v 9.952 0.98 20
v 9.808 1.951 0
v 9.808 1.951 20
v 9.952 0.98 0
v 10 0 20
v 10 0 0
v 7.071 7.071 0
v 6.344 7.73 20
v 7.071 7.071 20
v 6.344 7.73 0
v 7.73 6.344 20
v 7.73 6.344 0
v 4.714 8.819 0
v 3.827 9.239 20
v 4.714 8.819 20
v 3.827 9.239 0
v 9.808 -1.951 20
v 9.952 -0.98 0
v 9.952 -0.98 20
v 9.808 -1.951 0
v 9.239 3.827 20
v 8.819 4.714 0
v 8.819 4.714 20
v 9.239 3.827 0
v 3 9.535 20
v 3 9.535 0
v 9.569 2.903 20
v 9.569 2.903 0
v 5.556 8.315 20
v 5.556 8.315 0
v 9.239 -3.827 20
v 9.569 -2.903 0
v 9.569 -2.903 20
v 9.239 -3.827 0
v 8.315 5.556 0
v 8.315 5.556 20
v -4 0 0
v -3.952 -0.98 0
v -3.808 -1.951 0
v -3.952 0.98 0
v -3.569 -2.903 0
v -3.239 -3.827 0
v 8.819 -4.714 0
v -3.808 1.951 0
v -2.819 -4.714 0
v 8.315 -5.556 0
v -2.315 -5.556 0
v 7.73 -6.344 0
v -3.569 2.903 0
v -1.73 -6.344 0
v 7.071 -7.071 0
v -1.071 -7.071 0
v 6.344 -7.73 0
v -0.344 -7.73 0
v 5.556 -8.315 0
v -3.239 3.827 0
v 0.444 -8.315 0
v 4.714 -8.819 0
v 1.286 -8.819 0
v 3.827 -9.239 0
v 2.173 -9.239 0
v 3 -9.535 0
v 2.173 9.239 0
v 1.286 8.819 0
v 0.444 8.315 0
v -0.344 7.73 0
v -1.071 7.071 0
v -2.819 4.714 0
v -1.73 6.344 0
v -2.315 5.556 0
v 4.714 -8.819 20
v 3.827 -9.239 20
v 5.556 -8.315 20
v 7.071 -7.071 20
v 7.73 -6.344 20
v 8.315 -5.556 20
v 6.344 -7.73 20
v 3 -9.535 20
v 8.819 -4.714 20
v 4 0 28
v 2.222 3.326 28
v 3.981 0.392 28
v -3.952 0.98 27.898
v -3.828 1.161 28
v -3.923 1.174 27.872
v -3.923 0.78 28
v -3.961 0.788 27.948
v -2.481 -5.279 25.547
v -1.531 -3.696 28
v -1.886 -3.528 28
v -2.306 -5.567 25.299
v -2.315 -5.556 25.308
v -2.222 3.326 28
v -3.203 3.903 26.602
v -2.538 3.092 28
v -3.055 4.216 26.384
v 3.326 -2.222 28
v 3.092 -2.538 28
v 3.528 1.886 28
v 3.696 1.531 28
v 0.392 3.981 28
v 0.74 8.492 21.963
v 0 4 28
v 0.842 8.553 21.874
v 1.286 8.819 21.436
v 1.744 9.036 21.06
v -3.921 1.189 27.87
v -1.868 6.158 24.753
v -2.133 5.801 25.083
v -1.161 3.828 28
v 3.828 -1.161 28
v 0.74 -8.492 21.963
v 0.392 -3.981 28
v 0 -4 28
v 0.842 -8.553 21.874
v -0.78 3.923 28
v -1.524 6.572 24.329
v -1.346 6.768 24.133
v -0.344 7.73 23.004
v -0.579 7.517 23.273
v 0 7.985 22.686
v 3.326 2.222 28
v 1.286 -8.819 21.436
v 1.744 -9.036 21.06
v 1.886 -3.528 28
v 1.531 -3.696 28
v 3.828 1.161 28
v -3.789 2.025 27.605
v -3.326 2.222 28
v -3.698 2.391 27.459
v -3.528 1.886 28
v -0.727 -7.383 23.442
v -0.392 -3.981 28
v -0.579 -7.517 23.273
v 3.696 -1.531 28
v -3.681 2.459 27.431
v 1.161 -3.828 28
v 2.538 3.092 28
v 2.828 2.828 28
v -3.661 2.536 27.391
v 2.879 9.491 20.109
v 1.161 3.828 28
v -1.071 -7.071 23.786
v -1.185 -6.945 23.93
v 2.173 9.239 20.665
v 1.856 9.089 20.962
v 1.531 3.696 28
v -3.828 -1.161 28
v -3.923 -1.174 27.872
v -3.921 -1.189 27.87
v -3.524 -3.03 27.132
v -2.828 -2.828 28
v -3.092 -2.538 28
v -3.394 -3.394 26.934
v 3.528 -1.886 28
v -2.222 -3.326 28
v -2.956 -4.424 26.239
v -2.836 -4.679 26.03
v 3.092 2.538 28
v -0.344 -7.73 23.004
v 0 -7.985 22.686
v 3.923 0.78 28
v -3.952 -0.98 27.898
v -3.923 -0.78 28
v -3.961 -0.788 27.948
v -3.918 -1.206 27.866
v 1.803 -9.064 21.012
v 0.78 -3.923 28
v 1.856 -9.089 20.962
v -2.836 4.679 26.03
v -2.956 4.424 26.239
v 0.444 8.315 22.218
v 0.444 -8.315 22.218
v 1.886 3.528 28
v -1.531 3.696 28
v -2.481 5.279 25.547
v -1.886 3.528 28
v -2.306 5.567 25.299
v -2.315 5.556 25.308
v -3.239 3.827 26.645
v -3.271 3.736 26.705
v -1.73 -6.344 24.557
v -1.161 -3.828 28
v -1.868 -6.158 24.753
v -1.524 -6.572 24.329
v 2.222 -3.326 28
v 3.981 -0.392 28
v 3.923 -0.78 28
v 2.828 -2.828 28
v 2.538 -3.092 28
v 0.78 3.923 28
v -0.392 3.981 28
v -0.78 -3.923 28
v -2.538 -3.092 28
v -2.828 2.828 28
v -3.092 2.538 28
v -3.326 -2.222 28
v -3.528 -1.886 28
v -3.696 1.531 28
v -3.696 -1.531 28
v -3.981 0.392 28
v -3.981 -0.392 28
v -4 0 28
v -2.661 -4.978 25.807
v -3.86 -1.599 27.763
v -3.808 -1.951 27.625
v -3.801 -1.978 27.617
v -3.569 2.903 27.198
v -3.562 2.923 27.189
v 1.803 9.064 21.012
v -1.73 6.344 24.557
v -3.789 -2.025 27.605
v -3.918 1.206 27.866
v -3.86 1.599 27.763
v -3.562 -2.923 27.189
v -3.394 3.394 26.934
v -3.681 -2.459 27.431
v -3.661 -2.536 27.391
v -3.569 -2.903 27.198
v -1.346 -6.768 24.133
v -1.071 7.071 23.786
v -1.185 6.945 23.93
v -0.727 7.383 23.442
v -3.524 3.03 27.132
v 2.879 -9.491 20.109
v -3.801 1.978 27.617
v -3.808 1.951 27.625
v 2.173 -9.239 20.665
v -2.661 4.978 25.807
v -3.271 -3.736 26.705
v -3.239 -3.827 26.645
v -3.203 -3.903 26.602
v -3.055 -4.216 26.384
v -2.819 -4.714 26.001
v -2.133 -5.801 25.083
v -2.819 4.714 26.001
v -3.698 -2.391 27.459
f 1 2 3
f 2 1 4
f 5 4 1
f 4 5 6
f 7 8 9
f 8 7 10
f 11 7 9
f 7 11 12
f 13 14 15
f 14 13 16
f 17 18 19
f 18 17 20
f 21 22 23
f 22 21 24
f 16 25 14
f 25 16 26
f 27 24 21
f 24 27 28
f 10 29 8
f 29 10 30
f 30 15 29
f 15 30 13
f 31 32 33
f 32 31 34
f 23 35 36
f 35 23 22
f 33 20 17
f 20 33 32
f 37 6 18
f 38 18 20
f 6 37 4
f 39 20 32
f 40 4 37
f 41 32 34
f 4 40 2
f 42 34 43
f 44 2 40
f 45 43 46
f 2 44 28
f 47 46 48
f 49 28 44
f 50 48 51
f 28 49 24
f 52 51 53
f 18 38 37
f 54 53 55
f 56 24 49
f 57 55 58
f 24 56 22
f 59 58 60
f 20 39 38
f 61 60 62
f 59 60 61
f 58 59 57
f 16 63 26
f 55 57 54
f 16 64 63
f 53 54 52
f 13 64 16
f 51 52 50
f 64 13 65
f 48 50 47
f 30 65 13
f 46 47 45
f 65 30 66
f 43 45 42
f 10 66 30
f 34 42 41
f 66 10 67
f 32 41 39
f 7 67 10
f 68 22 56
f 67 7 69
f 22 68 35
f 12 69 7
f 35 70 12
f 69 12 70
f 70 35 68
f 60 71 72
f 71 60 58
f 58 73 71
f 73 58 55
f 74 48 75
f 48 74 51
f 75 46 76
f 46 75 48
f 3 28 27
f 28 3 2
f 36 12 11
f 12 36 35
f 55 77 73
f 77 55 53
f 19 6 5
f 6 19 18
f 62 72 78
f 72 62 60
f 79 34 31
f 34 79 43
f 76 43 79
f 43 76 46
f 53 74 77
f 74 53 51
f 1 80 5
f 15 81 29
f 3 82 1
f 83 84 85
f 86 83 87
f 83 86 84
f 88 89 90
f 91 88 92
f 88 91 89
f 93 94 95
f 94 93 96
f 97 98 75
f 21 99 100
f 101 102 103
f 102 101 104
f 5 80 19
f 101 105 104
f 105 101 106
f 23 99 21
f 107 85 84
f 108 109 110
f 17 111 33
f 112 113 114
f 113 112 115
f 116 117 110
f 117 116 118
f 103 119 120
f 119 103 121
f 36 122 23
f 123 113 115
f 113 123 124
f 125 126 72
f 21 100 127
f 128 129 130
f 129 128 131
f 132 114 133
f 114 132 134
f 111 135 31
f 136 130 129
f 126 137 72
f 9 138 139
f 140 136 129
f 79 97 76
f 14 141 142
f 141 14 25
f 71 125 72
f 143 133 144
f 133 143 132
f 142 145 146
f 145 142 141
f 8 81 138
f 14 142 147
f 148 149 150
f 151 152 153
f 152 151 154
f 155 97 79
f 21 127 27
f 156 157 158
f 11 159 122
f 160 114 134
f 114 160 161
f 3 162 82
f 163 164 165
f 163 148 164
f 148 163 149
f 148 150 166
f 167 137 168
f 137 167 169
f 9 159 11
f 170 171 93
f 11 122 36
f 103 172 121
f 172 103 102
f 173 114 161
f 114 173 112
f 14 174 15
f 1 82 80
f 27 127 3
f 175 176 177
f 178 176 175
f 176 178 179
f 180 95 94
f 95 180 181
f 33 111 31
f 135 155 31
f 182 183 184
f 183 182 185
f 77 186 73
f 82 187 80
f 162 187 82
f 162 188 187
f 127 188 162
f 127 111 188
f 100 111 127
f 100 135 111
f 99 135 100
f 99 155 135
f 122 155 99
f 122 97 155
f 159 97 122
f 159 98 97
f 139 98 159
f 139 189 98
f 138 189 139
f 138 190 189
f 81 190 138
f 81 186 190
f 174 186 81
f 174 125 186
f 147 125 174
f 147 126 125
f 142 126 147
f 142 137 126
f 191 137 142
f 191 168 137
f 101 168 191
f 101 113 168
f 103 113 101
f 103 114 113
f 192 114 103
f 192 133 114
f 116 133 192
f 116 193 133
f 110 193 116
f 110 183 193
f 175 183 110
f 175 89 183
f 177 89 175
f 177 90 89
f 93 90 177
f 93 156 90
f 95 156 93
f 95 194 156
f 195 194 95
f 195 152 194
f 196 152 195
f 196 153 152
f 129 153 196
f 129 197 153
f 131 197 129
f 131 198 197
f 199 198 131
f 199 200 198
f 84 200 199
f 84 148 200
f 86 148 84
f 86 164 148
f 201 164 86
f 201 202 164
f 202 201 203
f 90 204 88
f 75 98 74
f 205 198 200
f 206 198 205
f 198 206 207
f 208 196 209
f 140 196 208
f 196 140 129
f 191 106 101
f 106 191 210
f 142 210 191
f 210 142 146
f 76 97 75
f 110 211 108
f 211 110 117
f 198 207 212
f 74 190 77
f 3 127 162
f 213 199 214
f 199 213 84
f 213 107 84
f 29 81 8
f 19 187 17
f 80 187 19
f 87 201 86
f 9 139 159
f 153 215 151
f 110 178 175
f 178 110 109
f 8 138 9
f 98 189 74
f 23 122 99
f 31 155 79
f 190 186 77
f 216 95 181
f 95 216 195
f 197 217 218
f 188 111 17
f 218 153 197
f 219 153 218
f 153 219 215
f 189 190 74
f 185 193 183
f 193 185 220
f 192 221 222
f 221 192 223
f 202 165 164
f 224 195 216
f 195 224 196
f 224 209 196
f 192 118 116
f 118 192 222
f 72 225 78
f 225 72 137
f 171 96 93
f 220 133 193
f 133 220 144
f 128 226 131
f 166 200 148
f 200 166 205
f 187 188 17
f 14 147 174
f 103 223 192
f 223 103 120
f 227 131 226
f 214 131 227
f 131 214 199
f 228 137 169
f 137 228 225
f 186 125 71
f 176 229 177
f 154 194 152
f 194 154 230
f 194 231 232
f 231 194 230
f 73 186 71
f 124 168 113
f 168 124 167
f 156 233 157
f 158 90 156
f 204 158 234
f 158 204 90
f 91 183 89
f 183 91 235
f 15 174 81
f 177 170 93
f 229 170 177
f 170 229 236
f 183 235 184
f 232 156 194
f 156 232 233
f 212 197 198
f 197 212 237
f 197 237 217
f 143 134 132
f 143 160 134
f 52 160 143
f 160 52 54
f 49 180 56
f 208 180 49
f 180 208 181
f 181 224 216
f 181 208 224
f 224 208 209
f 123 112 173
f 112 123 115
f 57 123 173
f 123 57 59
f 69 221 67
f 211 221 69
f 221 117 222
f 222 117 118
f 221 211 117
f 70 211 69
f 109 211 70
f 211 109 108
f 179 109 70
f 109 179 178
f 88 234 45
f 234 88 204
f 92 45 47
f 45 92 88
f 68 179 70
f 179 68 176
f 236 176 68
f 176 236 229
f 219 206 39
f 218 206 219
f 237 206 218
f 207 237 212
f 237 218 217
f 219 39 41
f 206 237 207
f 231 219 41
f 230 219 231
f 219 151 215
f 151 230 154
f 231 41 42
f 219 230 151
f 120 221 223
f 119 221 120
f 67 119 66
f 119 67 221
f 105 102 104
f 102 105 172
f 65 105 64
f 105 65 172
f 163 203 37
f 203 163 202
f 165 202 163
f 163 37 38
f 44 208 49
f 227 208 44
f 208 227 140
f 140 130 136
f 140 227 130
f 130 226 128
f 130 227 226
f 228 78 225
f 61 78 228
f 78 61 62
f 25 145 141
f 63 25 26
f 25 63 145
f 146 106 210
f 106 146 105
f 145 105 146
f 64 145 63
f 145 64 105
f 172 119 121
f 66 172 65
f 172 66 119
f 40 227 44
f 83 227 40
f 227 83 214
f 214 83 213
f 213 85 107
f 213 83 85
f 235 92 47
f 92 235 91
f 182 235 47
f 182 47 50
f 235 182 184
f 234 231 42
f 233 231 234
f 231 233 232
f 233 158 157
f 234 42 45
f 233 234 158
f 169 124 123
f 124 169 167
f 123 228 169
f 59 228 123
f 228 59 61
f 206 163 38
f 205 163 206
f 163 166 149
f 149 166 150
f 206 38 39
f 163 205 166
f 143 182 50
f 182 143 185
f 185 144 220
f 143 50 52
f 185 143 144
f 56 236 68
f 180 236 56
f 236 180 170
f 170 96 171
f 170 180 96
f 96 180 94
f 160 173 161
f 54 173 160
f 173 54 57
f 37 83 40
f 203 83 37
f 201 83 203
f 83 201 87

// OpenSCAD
// A corner where one solid's cap meets another's wall, and a rim whose
// neighbour is fanned. Nine lines, and before the two fixes below it exported
// as three shells.
//
// It was registered WILL_FAIL when it was added, for a third defect neither of
// those fixes touched - two corners 3.6e-03 and 4.5e-03 off the analytic faces
// they bound - and ctest duly reported it as a *failure* on the day that stopped
// being true. What fixed it is the placement that puts a corner where the
// surfaces of the two analytic faces it bounds cross. See open items 3 and 18
// of doc/step-export-wip.md.
//
// Two defects meet in it, and neither is visible in the exact tier - that one is
// a clean solid. Both are the approximation pass's.
//
// **A corner is not where its two owners cross.** Provenance is per original
// solid: the first cylinder's original owns its wall, and its *cap* facets
// belong to that same original without being on it. So a vertex on the lens rim
// at z = 0 - where the second cylinder's wall meets the first one's bottom
// plane - is named by two walls, and the pair placement put it where those two
// walls cross, on the line x = 3, y = +/-9.5394. Twenty-six corners moved by up
// to 11.0267 on a part whose radius is 10, and the shell came apart along them.
// The other eighty-eight junctions here are real, sit on both their owners to
// 0.0120 - the 64-gon's own sagitta, 10(1 - cos(pi/64)) - and move at most
// 0.0192.
//
// **A rim cannot be handed to a face that will be fanned.** The cone's top rim
// at z = 28 is one CIRCLE on the cone's side; the cap across it is bent by the
// corner moves and so is fanned into triangles, and a fan writes one straight
// line per triangle side and never reads the substitution. That left the arc on
// one face and twenty-four chords on the other: twenty-five edges used by one
// face. The plane sections have guarded against this since item 11's root cause
// A was closed for them; the rims had not. Given up as an arc, the rim's chords
// are shared edges again, and the per-edge promotion then writes each of them as
// the arc it is - 62 arcs become 86, and the shell closes.
//
// The volume is derived twice, and the export has to lie between the two. Every
// cross section is the intersection of two circles - the part's own of radius
// a(z), and the second cylinder's of radius 10 at distance 6 - so the smooth
// solid is
//
//   20 * lens(10) + (1/0.75) * integral of lens(a) da from 4 to 10
//
// with lens(a) the standard two-circle overlap, which comes to 4891.296892. The
// mesh is the same integral over OpenSCAD's own inscribed 64-gons rather than
// circles, which comes to 4881.063273 and agrees with what the mesher reports to
// six decimals. An exported face is either the smooth surface or the mesh's
// chords, and chords are inscribed, so the solid cannot lie outside that
// bracket. It reads 4890.790271 with both flags, near the smooth end because
// most of this boundary is analytic, and 4885.633285 in the exact tier.
//
// VOLUME: 4886.180083 +/- 5.116809
// VOLUME-APPROX: 4886.180083 +/- 5.116809
//
// **What it reads now.** One solid, 4891.033991 with both flags and 4885.633285
// in the exact tier, worst kernel slack 0.007757, and every corner of every
// analytic face on the surface that face is written on. The approximation figure
// is 0.0054% under the smooth solid, which is the boundary that is still chords
// rather than the curve the two surfaces cross along.
//
// Known systemic defect: twelve facets of a D0 region - maker owns the
// surface, every corner on it exactly - are left as planes at the exact tier:
// formed as small quadric regions and refused by the writer's all-or-nothing
// boundary rule. D0 ground fallen to the tessellation with no proof that no
// closed form exists. Tolerated by name; the test fails the day it is no
// longer raised.
// KNOWN-EXPORT-ERROR: of a D0 region are left to the tessellation
// Open item 33 - on the CGAL backend, a planar face written with a bound off
// its plane - was carried here as a KNOWN-EXPORT-ERROR from 2026-09-24 until
// 2026-09-30, when the triangle merge began asking exact coplanarity: merging
// within 1e-8 of the model's size had put triangles whose corners were not on
// one plane into one planar face.
//
// Every facet its maker named for a declared surface is D0 by that heritage,
// whole or cut, and has to end in a face written on that surface (checklist
// B6, B7, E8). A facet a boolean cut is not in its surface's D0 region yet -
// the region holds whole facets only - so nothing proposes it at the exact
// tier, and at the approximation tier a statistic over the tessellation
// refuses it (C3). Measured 2026-09-29:
//   approximation tier, 2 facets (2 cut): 2 on cylinder 0 (a quadric face: fewer than three facets
//     of the surface were free to claim)
//   exact tier, 66 facets (54 cut): 26 on cone 5 (claimed by nothing for it); 26 on cylinder 6
//     (claimed by nothing for it); 12 on cone 5 (a quadric face: some of the surface's boundary is
//     off it, and half a surface is worse than none); 2 on cylinder 0 (claimed by nothing for it)
// Tolerated by name until cut facets join their region and no statistic
// vetoes a named facet (doc/step-export-wip.md, open item 34); the test
// fails the day it is no longer raised.
// KNOWN-EXPORT-ERROR: facets named by their maker for a declared surface are not written on it
//
// Every EXPORT-WARNING this fixture raises, named, each with why it is known;
// any other fails the test, and so does a named one no run raises any more.
//
// The census's side of the KNOWN-EXPORT-ERROR above: a declaration with mesh
// and no face written on it is one whose facets are not written on it.
// KNOWN-EXPORT-WARNING: a declaration that is not taken is a bug report
// KNOWN-EXPORT-WARNING: have mesh held under another surface's name
//
// One declared surface written partly by one recogniser and partly by
// another, the division decided by pass order - the split surface of open
// item 26, which R0 (item 29) has not reached here.
// KNOWN-EXPORT-WARNING: split between different kinds of recogniser
// KNOWN-EXPORT-WARNING: so this is one connected region cut in two by pass order

$fn = 64;
intersection() {
  union() {
    cylinder(r = 10, h = 20);
    translate([0, 0, 20]) cylinder(r1 = 10, r2 = 4, h = 8);
  }
  translate([6, 0, -1]) cylinder(r = 10, h = 40);
}
